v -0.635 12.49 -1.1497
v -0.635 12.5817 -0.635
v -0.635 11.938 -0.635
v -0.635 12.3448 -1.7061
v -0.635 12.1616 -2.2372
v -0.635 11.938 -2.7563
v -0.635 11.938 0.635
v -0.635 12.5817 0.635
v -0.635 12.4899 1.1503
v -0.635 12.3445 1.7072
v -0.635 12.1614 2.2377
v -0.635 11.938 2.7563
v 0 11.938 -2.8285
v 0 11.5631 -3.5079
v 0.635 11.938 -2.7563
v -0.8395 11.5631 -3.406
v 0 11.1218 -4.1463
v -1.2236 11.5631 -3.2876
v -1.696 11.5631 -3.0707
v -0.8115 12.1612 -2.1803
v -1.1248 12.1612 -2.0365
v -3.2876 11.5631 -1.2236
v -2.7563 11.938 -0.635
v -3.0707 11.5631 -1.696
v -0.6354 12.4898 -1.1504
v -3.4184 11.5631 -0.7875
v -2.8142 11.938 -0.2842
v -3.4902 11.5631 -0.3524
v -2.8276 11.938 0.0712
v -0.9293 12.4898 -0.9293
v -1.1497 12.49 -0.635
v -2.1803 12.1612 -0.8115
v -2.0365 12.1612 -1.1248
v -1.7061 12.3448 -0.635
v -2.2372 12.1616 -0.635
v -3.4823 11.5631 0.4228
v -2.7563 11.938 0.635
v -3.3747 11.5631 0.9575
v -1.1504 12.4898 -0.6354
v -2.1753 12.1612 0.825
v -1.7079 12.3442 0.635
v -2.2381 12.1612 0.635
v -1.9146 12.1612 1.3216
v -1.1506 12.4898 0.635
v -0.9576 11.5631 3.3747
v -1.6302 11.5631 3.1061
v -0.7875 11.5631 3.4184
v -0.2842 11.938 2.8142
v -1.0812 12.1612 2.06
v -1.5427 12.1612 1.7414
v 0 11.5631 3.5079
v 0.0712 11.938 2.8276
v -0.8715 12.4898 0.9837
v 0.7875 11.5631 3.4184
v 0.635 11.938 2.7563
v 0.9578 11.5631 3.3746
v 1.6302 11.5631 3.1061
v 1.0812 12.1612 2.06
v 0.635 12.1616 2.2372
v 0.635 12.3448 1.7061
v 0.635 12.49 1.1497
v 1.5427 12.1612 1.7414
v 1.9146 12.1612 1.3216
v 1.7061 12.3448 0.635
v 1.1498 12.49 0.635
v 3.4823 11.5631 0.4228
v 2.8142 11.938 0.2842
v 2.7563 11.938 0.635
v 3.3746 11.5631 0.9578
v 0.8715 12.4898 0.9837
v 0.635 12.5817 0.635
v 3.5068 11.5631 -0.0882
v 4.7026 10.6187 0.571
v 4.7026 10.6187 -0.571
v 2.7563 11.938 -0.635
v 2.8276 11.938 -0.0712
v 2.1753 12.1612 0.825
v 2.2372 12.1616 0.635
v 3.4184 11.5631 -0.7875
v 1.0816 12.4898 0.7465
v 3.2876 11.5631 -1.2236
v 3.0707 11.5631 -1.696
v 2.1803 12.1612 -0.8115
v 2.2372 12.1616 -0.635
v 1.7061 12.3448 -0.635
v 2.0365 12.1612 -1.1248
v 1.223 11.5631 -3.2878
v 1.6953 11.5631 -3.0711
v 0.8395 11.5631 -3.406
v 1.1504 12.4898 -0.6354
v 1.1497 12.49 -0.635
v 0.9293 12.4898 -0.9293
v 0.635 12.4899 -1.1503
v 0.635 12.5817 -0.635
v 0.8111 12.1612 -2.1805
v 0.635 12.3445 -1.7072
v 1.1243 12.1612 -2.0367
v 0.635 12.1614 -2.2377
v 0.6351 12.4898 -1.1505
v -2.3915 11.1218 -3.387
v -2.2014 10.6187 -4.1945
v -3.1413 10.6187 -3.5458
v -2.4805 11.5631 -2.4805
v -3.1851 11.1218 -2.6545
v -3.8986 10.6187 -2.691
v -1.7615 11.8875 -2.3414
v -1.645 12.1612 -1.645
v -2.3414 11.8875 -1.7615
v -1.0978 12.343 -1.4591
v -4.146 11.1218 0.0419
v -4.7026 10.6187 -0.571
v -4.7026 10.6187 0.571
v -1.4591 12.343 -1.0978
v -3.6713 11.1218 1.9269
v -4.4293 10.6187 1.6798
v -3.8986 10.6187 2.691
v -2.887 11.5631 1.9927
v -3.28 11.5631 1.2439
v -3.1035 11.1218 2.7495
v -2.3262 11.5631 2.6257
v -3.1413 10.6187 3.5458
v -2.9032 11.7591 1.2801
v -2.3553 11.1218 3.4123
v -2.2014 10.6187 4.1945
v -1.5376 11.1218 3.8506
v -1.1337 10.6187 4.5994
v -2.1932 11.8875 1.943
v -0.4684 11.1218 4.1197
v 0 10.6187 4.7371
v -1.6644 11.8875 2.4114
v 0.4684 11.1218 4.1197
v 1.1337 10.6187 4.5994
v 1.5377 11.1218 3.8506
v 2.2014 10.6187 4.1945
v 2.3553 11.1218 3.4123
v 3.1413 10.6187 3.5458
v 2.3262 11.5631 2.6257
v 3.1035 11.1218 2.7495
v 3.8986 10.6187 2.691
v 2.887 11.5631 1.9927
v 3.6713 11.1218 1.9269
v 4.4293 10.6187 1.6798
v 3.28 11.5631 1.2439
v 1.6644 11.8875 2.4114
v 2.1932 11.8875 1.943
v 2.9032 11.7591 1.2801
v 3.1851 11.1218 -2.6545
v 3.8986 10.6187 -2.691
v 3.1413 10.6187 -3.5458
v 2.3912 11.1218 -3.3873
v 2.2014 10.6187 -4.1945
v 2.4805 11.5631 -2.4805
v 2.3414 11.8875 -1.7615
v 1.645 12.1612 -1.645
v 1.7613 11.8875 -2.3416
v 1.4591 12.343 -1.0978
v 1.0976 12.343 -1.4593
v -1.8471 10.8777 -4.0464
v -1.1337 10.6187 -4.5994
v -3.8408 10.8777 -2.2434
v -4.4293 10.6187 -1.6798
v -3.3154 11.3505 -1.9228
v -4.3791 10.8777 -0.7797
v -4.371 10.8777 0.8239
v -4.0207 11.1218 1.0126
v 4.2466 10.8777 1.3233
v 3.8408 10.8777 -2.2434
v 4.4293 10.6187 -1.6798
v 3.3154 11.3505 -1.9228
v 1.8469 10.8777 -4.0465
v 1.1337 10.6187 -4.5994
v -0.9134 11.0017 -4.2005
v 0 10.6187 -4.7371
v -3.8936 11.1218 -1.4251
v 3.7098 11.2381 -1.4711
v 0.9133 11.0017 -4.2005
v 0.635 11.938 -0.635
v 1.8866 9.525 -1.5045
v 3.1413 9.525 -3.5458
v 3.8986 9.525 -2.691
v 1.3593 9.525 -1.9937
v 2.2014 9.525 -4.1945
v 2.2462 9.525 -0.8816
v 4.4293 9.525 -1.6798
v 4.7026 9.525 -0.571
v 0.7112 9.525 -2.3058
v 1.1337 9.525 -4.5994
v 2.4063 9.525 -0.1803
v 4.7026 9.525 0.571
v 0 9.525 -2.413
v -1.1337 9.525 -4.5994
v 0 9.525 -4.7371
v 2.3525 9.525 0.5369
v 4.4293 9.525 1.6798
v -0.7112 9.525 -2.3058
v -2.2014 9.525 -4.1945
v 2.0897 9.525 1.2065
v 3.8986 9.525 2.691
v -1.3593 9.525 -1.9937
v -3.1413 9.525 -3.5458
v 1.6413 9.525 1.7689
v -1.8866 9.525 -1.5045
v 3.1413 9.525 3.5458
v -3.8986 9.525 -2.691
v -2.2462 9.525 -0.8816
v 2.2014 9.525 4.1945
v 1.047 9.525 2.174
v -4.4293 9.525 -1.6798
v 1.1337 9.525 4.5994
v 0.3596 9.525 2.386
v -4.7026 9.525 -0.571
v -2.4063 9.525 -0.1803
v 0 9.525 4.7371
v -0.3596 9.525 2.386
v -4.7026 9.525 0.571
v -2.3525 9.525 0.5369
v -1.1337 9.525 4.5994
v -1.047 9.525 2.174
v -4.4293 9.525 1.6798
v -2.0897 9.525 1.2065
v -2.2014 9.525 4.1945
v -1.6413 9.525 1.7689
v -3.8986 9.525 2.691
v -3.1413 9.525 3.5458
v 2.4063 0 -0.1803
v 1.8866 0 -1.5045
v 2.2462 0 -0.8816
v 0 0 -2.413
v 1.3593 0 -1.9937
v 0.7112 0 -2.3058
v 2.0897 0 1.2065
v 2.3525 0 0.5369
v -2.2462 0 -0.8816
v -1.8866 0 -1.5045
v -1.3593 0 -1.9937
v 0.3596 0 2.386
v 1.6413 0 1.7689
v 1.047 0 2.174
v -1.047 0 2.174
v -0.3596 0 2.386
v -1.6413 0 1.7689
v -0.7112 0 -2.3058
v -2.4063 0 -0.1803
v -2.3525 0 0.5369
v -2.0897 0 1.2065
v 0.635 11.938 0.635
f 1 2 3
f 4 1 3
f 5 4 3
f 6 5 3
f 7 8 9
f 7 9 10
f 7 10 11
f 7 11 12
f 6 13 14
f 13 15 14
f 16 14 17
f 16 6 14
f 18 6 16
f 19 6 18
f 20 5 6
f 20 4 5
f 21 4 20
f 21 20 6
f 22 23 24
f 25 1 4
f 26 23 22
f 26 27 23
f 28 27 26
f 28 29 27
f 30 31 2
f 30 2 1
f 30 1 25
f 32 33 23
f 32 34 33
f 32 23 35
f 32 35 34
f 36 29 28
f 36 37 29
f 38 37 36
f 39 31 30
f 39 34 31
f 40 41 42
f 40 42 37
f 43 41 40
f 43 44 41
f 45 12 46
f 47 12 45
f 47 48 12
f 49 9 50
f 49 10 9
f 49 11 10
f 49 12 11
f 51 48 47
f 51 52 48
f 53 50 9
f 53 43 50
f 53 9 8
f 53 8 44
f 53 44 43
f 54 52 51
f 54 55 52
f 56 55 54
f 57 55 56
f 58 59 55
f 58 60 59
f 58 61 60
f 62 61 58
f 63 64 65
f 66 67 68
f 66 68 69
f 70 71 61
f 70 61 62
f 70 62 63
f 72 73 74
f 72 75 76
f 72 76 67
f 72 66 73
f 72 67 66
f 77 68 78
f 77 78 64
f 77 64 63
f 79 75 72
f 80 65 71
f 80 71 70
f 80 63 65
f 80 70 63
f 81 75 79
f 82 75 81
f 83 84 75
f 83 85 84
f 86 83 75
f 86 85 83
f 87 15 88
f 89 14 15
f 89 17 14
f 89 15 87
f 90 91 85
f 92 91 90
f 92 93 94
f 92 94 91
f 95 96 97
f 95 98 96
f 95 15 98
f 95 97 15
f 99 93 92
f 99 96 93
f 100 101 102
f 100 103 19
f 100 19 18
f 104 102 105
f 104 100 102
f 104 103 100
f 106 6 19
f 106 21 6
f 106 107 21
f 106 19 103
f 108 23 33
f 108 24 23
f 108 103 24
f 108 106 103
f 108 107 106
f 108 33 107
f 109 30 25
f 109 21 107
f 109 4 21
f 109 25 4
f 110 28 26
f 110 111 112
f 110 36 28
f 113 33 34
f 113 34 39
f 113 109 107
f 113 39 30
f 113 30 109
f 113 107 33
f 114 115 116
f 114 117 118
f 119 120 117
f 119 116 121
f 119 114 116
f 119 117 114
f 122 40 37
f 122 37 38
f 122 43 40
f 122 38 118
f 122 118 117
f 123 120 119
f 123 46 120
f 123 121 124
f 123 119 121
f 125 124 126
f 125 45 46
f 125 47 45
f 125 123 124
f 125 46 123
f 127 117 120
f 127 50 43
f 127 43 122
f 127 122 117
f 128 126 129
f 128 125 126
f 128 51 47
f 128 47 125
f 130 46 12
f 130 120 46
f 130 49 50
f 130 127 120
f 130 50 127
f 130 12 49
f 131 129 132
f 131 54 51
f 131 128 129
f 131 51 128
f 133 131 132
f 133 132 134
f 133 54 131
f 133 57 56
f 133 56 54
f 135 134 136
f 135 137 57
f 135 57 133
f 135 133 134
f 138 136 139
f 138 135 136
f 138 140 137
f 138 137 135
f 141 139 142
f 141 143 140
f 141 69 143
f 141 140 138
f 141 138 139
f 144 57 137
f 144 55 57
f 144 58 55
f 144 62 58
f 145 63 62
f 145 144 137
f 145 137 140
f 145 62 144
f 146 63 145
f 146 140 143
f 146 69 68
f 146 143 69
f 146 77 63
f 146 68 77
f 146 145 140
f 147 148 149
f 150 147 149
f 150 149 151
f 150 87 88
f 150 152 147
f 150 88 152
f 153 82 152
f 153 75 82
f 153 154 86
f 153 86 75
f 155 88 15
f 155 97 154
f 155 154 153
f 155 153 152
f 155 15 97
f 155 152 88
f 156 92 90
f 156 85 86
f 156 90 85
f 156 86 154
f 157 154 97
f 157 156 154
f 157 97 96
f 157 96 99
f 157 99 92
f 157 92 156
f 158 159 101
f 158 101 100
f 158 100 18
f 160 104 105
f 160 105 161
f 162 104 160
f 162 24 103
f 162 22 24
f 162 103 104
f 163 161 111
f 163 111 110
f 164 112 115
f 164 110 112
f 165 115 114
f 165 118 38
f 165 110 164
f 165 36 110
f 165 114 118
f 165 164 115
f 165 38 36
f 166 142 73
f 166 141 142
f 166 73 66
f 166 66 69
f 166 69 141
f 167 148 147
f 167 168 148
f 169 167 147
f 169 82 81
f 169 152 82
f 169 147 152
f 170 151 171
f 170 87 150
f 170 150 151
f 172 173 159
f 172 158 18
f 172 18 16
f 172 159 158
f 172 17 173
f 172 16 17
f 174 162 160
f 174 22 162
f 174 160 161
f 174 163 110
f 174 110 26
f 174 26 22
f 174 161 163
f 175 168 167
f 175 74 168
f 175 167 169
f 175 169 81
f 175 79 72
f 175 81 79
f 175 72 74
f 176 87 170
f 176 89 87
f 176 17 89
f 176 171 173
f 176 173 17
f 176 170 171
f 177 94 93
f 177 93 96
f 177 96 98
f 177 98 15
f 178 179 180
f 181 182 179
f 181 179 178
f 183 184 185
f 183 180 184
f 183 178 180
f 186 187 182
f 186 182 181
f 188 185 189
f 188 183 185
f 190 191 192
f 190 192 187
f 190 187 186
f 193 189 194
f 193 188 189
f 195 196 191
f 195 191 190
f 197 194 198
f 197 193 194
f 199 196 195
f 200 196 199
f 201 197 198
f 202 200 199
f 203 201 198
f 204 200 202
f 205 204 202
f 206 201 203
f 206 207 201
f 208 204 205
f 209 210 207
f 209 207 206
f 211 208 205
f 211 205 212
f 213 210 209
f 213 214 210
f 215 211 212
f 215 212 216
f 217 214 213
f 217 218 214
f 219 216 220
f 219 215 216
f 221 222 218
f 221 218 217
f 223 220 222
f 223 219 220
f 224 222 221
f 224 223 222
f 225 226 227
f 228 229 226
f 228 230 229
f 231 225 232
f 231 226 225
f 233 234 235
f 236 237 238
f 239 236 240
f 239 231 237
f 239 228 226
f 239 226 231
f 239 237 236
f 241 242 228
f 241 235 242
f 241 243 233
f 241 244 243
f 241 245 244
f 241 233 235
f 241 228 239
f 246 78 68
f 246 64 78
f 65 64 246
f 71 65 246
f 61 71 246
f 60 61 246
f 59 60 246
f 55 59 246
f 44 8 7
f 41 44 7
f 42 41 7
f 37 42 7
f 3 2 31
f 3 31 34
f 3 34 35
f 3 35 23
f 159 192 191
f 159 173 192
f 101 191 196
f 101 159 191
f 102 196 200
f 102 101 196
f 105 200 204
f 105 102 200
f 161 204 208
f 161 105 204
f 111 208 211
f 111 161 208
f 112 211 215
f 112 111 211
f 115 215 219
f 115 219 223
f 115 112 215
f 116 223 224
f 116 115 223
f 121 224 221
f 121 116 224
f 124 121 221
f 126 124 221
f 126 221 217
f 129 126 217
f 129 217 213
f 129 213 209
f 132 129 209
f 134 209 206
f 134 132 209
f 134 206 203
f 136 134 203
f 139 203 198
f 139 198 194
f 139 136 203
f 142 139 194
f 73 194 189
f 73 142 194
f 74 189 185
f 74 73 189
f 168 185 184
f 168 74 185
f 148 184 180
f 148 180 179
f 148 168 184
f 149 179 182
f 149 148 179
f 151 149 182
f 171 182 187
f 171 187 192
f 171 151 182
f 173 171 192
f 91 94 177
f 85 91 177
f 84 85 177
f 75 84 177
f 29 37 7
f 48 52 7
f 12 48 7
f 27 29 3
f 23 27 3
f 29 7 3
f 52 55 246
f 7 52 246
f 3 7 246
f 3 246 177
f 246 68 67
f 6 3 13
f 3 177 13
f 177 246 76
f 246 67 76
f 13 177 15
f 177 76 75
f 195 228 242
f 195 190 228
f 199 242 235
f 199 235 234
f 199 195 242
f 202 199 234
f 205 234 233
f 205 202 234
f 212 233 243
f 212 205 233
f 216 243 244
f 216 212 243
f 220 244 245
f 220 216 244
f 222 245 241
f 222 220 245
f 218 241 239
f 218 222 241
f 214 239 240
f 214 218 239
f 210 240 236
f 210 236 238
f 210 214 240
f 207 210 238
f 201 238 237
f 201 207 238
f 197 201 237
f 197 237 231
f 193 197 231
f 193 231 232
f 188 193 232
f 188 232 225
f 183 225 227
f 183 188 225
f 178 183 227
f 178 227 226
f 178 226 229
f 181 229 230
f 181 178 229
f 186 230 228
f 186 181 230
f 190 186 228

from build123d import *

# Parameters (mm, degrees)
CUT_EXTRUDE1_DEPTH = 0.635
CIRPATTERN1_COUNT  = 4


with BuildPart() as part:
    # Sketch1 → Revolve1 (revolve)
    with BuildSketch(Plane.XY, mode=Mode.PRIVATE) as revolve1_sk:
        with BuildLine():
            Line((0, 0), (2.413, 0))
            Line((2.413, 0), (2.413, 9.525))
            Line((2.413, 9.525), (4.7371, 9.525))
            Line((4.7371, 9.525), (4.7371, 10.618743367))
            ThreePointArc((4.7371, 10.618743367), (2.548065575, 12.067962924), (0, 12.7))
            Line((0, 12.7), (0, 0))
        make_face()
    revolve(revolve1_sk.sketch.rotate(Axis((0, 0, 0), (0, 1, 0)), 90), axis=Axis((0, 0, 0), (0, 1, 0)))

    # Sketch2 → Cut-Extrude1 (cut, symmetric)
    with BuildSketch(Plane.XY):
        with BuildLine():
            Line((0, 11.938), (2.828492677, 11.938))
            ThreePointArc((2.828492677, 11.938), (1.450712269, 12.454359079), (0, 12.7))
            Line((0, 12.7), (0, 11.938))
        make_face()
    cut_extrude1 = extrude(amount=CUT_EXTRUDE1_DEPTH, both=True, mode=Mode.SUBTRACT)

    # CirPattern1: Cut-Extrude1 ×4 about axis
    cirpattern1_axis = Axis((0, 0, 0), (0, 1, 0))
    for i in range(1, CIRPATTERN1_COUNT):
        add(cut_extrude1.rotate(cirpattern1_axis, i * 360 / CIRPATTERN1_COUNT), mode=Mode.SUBTRACT)


solid = part.part
